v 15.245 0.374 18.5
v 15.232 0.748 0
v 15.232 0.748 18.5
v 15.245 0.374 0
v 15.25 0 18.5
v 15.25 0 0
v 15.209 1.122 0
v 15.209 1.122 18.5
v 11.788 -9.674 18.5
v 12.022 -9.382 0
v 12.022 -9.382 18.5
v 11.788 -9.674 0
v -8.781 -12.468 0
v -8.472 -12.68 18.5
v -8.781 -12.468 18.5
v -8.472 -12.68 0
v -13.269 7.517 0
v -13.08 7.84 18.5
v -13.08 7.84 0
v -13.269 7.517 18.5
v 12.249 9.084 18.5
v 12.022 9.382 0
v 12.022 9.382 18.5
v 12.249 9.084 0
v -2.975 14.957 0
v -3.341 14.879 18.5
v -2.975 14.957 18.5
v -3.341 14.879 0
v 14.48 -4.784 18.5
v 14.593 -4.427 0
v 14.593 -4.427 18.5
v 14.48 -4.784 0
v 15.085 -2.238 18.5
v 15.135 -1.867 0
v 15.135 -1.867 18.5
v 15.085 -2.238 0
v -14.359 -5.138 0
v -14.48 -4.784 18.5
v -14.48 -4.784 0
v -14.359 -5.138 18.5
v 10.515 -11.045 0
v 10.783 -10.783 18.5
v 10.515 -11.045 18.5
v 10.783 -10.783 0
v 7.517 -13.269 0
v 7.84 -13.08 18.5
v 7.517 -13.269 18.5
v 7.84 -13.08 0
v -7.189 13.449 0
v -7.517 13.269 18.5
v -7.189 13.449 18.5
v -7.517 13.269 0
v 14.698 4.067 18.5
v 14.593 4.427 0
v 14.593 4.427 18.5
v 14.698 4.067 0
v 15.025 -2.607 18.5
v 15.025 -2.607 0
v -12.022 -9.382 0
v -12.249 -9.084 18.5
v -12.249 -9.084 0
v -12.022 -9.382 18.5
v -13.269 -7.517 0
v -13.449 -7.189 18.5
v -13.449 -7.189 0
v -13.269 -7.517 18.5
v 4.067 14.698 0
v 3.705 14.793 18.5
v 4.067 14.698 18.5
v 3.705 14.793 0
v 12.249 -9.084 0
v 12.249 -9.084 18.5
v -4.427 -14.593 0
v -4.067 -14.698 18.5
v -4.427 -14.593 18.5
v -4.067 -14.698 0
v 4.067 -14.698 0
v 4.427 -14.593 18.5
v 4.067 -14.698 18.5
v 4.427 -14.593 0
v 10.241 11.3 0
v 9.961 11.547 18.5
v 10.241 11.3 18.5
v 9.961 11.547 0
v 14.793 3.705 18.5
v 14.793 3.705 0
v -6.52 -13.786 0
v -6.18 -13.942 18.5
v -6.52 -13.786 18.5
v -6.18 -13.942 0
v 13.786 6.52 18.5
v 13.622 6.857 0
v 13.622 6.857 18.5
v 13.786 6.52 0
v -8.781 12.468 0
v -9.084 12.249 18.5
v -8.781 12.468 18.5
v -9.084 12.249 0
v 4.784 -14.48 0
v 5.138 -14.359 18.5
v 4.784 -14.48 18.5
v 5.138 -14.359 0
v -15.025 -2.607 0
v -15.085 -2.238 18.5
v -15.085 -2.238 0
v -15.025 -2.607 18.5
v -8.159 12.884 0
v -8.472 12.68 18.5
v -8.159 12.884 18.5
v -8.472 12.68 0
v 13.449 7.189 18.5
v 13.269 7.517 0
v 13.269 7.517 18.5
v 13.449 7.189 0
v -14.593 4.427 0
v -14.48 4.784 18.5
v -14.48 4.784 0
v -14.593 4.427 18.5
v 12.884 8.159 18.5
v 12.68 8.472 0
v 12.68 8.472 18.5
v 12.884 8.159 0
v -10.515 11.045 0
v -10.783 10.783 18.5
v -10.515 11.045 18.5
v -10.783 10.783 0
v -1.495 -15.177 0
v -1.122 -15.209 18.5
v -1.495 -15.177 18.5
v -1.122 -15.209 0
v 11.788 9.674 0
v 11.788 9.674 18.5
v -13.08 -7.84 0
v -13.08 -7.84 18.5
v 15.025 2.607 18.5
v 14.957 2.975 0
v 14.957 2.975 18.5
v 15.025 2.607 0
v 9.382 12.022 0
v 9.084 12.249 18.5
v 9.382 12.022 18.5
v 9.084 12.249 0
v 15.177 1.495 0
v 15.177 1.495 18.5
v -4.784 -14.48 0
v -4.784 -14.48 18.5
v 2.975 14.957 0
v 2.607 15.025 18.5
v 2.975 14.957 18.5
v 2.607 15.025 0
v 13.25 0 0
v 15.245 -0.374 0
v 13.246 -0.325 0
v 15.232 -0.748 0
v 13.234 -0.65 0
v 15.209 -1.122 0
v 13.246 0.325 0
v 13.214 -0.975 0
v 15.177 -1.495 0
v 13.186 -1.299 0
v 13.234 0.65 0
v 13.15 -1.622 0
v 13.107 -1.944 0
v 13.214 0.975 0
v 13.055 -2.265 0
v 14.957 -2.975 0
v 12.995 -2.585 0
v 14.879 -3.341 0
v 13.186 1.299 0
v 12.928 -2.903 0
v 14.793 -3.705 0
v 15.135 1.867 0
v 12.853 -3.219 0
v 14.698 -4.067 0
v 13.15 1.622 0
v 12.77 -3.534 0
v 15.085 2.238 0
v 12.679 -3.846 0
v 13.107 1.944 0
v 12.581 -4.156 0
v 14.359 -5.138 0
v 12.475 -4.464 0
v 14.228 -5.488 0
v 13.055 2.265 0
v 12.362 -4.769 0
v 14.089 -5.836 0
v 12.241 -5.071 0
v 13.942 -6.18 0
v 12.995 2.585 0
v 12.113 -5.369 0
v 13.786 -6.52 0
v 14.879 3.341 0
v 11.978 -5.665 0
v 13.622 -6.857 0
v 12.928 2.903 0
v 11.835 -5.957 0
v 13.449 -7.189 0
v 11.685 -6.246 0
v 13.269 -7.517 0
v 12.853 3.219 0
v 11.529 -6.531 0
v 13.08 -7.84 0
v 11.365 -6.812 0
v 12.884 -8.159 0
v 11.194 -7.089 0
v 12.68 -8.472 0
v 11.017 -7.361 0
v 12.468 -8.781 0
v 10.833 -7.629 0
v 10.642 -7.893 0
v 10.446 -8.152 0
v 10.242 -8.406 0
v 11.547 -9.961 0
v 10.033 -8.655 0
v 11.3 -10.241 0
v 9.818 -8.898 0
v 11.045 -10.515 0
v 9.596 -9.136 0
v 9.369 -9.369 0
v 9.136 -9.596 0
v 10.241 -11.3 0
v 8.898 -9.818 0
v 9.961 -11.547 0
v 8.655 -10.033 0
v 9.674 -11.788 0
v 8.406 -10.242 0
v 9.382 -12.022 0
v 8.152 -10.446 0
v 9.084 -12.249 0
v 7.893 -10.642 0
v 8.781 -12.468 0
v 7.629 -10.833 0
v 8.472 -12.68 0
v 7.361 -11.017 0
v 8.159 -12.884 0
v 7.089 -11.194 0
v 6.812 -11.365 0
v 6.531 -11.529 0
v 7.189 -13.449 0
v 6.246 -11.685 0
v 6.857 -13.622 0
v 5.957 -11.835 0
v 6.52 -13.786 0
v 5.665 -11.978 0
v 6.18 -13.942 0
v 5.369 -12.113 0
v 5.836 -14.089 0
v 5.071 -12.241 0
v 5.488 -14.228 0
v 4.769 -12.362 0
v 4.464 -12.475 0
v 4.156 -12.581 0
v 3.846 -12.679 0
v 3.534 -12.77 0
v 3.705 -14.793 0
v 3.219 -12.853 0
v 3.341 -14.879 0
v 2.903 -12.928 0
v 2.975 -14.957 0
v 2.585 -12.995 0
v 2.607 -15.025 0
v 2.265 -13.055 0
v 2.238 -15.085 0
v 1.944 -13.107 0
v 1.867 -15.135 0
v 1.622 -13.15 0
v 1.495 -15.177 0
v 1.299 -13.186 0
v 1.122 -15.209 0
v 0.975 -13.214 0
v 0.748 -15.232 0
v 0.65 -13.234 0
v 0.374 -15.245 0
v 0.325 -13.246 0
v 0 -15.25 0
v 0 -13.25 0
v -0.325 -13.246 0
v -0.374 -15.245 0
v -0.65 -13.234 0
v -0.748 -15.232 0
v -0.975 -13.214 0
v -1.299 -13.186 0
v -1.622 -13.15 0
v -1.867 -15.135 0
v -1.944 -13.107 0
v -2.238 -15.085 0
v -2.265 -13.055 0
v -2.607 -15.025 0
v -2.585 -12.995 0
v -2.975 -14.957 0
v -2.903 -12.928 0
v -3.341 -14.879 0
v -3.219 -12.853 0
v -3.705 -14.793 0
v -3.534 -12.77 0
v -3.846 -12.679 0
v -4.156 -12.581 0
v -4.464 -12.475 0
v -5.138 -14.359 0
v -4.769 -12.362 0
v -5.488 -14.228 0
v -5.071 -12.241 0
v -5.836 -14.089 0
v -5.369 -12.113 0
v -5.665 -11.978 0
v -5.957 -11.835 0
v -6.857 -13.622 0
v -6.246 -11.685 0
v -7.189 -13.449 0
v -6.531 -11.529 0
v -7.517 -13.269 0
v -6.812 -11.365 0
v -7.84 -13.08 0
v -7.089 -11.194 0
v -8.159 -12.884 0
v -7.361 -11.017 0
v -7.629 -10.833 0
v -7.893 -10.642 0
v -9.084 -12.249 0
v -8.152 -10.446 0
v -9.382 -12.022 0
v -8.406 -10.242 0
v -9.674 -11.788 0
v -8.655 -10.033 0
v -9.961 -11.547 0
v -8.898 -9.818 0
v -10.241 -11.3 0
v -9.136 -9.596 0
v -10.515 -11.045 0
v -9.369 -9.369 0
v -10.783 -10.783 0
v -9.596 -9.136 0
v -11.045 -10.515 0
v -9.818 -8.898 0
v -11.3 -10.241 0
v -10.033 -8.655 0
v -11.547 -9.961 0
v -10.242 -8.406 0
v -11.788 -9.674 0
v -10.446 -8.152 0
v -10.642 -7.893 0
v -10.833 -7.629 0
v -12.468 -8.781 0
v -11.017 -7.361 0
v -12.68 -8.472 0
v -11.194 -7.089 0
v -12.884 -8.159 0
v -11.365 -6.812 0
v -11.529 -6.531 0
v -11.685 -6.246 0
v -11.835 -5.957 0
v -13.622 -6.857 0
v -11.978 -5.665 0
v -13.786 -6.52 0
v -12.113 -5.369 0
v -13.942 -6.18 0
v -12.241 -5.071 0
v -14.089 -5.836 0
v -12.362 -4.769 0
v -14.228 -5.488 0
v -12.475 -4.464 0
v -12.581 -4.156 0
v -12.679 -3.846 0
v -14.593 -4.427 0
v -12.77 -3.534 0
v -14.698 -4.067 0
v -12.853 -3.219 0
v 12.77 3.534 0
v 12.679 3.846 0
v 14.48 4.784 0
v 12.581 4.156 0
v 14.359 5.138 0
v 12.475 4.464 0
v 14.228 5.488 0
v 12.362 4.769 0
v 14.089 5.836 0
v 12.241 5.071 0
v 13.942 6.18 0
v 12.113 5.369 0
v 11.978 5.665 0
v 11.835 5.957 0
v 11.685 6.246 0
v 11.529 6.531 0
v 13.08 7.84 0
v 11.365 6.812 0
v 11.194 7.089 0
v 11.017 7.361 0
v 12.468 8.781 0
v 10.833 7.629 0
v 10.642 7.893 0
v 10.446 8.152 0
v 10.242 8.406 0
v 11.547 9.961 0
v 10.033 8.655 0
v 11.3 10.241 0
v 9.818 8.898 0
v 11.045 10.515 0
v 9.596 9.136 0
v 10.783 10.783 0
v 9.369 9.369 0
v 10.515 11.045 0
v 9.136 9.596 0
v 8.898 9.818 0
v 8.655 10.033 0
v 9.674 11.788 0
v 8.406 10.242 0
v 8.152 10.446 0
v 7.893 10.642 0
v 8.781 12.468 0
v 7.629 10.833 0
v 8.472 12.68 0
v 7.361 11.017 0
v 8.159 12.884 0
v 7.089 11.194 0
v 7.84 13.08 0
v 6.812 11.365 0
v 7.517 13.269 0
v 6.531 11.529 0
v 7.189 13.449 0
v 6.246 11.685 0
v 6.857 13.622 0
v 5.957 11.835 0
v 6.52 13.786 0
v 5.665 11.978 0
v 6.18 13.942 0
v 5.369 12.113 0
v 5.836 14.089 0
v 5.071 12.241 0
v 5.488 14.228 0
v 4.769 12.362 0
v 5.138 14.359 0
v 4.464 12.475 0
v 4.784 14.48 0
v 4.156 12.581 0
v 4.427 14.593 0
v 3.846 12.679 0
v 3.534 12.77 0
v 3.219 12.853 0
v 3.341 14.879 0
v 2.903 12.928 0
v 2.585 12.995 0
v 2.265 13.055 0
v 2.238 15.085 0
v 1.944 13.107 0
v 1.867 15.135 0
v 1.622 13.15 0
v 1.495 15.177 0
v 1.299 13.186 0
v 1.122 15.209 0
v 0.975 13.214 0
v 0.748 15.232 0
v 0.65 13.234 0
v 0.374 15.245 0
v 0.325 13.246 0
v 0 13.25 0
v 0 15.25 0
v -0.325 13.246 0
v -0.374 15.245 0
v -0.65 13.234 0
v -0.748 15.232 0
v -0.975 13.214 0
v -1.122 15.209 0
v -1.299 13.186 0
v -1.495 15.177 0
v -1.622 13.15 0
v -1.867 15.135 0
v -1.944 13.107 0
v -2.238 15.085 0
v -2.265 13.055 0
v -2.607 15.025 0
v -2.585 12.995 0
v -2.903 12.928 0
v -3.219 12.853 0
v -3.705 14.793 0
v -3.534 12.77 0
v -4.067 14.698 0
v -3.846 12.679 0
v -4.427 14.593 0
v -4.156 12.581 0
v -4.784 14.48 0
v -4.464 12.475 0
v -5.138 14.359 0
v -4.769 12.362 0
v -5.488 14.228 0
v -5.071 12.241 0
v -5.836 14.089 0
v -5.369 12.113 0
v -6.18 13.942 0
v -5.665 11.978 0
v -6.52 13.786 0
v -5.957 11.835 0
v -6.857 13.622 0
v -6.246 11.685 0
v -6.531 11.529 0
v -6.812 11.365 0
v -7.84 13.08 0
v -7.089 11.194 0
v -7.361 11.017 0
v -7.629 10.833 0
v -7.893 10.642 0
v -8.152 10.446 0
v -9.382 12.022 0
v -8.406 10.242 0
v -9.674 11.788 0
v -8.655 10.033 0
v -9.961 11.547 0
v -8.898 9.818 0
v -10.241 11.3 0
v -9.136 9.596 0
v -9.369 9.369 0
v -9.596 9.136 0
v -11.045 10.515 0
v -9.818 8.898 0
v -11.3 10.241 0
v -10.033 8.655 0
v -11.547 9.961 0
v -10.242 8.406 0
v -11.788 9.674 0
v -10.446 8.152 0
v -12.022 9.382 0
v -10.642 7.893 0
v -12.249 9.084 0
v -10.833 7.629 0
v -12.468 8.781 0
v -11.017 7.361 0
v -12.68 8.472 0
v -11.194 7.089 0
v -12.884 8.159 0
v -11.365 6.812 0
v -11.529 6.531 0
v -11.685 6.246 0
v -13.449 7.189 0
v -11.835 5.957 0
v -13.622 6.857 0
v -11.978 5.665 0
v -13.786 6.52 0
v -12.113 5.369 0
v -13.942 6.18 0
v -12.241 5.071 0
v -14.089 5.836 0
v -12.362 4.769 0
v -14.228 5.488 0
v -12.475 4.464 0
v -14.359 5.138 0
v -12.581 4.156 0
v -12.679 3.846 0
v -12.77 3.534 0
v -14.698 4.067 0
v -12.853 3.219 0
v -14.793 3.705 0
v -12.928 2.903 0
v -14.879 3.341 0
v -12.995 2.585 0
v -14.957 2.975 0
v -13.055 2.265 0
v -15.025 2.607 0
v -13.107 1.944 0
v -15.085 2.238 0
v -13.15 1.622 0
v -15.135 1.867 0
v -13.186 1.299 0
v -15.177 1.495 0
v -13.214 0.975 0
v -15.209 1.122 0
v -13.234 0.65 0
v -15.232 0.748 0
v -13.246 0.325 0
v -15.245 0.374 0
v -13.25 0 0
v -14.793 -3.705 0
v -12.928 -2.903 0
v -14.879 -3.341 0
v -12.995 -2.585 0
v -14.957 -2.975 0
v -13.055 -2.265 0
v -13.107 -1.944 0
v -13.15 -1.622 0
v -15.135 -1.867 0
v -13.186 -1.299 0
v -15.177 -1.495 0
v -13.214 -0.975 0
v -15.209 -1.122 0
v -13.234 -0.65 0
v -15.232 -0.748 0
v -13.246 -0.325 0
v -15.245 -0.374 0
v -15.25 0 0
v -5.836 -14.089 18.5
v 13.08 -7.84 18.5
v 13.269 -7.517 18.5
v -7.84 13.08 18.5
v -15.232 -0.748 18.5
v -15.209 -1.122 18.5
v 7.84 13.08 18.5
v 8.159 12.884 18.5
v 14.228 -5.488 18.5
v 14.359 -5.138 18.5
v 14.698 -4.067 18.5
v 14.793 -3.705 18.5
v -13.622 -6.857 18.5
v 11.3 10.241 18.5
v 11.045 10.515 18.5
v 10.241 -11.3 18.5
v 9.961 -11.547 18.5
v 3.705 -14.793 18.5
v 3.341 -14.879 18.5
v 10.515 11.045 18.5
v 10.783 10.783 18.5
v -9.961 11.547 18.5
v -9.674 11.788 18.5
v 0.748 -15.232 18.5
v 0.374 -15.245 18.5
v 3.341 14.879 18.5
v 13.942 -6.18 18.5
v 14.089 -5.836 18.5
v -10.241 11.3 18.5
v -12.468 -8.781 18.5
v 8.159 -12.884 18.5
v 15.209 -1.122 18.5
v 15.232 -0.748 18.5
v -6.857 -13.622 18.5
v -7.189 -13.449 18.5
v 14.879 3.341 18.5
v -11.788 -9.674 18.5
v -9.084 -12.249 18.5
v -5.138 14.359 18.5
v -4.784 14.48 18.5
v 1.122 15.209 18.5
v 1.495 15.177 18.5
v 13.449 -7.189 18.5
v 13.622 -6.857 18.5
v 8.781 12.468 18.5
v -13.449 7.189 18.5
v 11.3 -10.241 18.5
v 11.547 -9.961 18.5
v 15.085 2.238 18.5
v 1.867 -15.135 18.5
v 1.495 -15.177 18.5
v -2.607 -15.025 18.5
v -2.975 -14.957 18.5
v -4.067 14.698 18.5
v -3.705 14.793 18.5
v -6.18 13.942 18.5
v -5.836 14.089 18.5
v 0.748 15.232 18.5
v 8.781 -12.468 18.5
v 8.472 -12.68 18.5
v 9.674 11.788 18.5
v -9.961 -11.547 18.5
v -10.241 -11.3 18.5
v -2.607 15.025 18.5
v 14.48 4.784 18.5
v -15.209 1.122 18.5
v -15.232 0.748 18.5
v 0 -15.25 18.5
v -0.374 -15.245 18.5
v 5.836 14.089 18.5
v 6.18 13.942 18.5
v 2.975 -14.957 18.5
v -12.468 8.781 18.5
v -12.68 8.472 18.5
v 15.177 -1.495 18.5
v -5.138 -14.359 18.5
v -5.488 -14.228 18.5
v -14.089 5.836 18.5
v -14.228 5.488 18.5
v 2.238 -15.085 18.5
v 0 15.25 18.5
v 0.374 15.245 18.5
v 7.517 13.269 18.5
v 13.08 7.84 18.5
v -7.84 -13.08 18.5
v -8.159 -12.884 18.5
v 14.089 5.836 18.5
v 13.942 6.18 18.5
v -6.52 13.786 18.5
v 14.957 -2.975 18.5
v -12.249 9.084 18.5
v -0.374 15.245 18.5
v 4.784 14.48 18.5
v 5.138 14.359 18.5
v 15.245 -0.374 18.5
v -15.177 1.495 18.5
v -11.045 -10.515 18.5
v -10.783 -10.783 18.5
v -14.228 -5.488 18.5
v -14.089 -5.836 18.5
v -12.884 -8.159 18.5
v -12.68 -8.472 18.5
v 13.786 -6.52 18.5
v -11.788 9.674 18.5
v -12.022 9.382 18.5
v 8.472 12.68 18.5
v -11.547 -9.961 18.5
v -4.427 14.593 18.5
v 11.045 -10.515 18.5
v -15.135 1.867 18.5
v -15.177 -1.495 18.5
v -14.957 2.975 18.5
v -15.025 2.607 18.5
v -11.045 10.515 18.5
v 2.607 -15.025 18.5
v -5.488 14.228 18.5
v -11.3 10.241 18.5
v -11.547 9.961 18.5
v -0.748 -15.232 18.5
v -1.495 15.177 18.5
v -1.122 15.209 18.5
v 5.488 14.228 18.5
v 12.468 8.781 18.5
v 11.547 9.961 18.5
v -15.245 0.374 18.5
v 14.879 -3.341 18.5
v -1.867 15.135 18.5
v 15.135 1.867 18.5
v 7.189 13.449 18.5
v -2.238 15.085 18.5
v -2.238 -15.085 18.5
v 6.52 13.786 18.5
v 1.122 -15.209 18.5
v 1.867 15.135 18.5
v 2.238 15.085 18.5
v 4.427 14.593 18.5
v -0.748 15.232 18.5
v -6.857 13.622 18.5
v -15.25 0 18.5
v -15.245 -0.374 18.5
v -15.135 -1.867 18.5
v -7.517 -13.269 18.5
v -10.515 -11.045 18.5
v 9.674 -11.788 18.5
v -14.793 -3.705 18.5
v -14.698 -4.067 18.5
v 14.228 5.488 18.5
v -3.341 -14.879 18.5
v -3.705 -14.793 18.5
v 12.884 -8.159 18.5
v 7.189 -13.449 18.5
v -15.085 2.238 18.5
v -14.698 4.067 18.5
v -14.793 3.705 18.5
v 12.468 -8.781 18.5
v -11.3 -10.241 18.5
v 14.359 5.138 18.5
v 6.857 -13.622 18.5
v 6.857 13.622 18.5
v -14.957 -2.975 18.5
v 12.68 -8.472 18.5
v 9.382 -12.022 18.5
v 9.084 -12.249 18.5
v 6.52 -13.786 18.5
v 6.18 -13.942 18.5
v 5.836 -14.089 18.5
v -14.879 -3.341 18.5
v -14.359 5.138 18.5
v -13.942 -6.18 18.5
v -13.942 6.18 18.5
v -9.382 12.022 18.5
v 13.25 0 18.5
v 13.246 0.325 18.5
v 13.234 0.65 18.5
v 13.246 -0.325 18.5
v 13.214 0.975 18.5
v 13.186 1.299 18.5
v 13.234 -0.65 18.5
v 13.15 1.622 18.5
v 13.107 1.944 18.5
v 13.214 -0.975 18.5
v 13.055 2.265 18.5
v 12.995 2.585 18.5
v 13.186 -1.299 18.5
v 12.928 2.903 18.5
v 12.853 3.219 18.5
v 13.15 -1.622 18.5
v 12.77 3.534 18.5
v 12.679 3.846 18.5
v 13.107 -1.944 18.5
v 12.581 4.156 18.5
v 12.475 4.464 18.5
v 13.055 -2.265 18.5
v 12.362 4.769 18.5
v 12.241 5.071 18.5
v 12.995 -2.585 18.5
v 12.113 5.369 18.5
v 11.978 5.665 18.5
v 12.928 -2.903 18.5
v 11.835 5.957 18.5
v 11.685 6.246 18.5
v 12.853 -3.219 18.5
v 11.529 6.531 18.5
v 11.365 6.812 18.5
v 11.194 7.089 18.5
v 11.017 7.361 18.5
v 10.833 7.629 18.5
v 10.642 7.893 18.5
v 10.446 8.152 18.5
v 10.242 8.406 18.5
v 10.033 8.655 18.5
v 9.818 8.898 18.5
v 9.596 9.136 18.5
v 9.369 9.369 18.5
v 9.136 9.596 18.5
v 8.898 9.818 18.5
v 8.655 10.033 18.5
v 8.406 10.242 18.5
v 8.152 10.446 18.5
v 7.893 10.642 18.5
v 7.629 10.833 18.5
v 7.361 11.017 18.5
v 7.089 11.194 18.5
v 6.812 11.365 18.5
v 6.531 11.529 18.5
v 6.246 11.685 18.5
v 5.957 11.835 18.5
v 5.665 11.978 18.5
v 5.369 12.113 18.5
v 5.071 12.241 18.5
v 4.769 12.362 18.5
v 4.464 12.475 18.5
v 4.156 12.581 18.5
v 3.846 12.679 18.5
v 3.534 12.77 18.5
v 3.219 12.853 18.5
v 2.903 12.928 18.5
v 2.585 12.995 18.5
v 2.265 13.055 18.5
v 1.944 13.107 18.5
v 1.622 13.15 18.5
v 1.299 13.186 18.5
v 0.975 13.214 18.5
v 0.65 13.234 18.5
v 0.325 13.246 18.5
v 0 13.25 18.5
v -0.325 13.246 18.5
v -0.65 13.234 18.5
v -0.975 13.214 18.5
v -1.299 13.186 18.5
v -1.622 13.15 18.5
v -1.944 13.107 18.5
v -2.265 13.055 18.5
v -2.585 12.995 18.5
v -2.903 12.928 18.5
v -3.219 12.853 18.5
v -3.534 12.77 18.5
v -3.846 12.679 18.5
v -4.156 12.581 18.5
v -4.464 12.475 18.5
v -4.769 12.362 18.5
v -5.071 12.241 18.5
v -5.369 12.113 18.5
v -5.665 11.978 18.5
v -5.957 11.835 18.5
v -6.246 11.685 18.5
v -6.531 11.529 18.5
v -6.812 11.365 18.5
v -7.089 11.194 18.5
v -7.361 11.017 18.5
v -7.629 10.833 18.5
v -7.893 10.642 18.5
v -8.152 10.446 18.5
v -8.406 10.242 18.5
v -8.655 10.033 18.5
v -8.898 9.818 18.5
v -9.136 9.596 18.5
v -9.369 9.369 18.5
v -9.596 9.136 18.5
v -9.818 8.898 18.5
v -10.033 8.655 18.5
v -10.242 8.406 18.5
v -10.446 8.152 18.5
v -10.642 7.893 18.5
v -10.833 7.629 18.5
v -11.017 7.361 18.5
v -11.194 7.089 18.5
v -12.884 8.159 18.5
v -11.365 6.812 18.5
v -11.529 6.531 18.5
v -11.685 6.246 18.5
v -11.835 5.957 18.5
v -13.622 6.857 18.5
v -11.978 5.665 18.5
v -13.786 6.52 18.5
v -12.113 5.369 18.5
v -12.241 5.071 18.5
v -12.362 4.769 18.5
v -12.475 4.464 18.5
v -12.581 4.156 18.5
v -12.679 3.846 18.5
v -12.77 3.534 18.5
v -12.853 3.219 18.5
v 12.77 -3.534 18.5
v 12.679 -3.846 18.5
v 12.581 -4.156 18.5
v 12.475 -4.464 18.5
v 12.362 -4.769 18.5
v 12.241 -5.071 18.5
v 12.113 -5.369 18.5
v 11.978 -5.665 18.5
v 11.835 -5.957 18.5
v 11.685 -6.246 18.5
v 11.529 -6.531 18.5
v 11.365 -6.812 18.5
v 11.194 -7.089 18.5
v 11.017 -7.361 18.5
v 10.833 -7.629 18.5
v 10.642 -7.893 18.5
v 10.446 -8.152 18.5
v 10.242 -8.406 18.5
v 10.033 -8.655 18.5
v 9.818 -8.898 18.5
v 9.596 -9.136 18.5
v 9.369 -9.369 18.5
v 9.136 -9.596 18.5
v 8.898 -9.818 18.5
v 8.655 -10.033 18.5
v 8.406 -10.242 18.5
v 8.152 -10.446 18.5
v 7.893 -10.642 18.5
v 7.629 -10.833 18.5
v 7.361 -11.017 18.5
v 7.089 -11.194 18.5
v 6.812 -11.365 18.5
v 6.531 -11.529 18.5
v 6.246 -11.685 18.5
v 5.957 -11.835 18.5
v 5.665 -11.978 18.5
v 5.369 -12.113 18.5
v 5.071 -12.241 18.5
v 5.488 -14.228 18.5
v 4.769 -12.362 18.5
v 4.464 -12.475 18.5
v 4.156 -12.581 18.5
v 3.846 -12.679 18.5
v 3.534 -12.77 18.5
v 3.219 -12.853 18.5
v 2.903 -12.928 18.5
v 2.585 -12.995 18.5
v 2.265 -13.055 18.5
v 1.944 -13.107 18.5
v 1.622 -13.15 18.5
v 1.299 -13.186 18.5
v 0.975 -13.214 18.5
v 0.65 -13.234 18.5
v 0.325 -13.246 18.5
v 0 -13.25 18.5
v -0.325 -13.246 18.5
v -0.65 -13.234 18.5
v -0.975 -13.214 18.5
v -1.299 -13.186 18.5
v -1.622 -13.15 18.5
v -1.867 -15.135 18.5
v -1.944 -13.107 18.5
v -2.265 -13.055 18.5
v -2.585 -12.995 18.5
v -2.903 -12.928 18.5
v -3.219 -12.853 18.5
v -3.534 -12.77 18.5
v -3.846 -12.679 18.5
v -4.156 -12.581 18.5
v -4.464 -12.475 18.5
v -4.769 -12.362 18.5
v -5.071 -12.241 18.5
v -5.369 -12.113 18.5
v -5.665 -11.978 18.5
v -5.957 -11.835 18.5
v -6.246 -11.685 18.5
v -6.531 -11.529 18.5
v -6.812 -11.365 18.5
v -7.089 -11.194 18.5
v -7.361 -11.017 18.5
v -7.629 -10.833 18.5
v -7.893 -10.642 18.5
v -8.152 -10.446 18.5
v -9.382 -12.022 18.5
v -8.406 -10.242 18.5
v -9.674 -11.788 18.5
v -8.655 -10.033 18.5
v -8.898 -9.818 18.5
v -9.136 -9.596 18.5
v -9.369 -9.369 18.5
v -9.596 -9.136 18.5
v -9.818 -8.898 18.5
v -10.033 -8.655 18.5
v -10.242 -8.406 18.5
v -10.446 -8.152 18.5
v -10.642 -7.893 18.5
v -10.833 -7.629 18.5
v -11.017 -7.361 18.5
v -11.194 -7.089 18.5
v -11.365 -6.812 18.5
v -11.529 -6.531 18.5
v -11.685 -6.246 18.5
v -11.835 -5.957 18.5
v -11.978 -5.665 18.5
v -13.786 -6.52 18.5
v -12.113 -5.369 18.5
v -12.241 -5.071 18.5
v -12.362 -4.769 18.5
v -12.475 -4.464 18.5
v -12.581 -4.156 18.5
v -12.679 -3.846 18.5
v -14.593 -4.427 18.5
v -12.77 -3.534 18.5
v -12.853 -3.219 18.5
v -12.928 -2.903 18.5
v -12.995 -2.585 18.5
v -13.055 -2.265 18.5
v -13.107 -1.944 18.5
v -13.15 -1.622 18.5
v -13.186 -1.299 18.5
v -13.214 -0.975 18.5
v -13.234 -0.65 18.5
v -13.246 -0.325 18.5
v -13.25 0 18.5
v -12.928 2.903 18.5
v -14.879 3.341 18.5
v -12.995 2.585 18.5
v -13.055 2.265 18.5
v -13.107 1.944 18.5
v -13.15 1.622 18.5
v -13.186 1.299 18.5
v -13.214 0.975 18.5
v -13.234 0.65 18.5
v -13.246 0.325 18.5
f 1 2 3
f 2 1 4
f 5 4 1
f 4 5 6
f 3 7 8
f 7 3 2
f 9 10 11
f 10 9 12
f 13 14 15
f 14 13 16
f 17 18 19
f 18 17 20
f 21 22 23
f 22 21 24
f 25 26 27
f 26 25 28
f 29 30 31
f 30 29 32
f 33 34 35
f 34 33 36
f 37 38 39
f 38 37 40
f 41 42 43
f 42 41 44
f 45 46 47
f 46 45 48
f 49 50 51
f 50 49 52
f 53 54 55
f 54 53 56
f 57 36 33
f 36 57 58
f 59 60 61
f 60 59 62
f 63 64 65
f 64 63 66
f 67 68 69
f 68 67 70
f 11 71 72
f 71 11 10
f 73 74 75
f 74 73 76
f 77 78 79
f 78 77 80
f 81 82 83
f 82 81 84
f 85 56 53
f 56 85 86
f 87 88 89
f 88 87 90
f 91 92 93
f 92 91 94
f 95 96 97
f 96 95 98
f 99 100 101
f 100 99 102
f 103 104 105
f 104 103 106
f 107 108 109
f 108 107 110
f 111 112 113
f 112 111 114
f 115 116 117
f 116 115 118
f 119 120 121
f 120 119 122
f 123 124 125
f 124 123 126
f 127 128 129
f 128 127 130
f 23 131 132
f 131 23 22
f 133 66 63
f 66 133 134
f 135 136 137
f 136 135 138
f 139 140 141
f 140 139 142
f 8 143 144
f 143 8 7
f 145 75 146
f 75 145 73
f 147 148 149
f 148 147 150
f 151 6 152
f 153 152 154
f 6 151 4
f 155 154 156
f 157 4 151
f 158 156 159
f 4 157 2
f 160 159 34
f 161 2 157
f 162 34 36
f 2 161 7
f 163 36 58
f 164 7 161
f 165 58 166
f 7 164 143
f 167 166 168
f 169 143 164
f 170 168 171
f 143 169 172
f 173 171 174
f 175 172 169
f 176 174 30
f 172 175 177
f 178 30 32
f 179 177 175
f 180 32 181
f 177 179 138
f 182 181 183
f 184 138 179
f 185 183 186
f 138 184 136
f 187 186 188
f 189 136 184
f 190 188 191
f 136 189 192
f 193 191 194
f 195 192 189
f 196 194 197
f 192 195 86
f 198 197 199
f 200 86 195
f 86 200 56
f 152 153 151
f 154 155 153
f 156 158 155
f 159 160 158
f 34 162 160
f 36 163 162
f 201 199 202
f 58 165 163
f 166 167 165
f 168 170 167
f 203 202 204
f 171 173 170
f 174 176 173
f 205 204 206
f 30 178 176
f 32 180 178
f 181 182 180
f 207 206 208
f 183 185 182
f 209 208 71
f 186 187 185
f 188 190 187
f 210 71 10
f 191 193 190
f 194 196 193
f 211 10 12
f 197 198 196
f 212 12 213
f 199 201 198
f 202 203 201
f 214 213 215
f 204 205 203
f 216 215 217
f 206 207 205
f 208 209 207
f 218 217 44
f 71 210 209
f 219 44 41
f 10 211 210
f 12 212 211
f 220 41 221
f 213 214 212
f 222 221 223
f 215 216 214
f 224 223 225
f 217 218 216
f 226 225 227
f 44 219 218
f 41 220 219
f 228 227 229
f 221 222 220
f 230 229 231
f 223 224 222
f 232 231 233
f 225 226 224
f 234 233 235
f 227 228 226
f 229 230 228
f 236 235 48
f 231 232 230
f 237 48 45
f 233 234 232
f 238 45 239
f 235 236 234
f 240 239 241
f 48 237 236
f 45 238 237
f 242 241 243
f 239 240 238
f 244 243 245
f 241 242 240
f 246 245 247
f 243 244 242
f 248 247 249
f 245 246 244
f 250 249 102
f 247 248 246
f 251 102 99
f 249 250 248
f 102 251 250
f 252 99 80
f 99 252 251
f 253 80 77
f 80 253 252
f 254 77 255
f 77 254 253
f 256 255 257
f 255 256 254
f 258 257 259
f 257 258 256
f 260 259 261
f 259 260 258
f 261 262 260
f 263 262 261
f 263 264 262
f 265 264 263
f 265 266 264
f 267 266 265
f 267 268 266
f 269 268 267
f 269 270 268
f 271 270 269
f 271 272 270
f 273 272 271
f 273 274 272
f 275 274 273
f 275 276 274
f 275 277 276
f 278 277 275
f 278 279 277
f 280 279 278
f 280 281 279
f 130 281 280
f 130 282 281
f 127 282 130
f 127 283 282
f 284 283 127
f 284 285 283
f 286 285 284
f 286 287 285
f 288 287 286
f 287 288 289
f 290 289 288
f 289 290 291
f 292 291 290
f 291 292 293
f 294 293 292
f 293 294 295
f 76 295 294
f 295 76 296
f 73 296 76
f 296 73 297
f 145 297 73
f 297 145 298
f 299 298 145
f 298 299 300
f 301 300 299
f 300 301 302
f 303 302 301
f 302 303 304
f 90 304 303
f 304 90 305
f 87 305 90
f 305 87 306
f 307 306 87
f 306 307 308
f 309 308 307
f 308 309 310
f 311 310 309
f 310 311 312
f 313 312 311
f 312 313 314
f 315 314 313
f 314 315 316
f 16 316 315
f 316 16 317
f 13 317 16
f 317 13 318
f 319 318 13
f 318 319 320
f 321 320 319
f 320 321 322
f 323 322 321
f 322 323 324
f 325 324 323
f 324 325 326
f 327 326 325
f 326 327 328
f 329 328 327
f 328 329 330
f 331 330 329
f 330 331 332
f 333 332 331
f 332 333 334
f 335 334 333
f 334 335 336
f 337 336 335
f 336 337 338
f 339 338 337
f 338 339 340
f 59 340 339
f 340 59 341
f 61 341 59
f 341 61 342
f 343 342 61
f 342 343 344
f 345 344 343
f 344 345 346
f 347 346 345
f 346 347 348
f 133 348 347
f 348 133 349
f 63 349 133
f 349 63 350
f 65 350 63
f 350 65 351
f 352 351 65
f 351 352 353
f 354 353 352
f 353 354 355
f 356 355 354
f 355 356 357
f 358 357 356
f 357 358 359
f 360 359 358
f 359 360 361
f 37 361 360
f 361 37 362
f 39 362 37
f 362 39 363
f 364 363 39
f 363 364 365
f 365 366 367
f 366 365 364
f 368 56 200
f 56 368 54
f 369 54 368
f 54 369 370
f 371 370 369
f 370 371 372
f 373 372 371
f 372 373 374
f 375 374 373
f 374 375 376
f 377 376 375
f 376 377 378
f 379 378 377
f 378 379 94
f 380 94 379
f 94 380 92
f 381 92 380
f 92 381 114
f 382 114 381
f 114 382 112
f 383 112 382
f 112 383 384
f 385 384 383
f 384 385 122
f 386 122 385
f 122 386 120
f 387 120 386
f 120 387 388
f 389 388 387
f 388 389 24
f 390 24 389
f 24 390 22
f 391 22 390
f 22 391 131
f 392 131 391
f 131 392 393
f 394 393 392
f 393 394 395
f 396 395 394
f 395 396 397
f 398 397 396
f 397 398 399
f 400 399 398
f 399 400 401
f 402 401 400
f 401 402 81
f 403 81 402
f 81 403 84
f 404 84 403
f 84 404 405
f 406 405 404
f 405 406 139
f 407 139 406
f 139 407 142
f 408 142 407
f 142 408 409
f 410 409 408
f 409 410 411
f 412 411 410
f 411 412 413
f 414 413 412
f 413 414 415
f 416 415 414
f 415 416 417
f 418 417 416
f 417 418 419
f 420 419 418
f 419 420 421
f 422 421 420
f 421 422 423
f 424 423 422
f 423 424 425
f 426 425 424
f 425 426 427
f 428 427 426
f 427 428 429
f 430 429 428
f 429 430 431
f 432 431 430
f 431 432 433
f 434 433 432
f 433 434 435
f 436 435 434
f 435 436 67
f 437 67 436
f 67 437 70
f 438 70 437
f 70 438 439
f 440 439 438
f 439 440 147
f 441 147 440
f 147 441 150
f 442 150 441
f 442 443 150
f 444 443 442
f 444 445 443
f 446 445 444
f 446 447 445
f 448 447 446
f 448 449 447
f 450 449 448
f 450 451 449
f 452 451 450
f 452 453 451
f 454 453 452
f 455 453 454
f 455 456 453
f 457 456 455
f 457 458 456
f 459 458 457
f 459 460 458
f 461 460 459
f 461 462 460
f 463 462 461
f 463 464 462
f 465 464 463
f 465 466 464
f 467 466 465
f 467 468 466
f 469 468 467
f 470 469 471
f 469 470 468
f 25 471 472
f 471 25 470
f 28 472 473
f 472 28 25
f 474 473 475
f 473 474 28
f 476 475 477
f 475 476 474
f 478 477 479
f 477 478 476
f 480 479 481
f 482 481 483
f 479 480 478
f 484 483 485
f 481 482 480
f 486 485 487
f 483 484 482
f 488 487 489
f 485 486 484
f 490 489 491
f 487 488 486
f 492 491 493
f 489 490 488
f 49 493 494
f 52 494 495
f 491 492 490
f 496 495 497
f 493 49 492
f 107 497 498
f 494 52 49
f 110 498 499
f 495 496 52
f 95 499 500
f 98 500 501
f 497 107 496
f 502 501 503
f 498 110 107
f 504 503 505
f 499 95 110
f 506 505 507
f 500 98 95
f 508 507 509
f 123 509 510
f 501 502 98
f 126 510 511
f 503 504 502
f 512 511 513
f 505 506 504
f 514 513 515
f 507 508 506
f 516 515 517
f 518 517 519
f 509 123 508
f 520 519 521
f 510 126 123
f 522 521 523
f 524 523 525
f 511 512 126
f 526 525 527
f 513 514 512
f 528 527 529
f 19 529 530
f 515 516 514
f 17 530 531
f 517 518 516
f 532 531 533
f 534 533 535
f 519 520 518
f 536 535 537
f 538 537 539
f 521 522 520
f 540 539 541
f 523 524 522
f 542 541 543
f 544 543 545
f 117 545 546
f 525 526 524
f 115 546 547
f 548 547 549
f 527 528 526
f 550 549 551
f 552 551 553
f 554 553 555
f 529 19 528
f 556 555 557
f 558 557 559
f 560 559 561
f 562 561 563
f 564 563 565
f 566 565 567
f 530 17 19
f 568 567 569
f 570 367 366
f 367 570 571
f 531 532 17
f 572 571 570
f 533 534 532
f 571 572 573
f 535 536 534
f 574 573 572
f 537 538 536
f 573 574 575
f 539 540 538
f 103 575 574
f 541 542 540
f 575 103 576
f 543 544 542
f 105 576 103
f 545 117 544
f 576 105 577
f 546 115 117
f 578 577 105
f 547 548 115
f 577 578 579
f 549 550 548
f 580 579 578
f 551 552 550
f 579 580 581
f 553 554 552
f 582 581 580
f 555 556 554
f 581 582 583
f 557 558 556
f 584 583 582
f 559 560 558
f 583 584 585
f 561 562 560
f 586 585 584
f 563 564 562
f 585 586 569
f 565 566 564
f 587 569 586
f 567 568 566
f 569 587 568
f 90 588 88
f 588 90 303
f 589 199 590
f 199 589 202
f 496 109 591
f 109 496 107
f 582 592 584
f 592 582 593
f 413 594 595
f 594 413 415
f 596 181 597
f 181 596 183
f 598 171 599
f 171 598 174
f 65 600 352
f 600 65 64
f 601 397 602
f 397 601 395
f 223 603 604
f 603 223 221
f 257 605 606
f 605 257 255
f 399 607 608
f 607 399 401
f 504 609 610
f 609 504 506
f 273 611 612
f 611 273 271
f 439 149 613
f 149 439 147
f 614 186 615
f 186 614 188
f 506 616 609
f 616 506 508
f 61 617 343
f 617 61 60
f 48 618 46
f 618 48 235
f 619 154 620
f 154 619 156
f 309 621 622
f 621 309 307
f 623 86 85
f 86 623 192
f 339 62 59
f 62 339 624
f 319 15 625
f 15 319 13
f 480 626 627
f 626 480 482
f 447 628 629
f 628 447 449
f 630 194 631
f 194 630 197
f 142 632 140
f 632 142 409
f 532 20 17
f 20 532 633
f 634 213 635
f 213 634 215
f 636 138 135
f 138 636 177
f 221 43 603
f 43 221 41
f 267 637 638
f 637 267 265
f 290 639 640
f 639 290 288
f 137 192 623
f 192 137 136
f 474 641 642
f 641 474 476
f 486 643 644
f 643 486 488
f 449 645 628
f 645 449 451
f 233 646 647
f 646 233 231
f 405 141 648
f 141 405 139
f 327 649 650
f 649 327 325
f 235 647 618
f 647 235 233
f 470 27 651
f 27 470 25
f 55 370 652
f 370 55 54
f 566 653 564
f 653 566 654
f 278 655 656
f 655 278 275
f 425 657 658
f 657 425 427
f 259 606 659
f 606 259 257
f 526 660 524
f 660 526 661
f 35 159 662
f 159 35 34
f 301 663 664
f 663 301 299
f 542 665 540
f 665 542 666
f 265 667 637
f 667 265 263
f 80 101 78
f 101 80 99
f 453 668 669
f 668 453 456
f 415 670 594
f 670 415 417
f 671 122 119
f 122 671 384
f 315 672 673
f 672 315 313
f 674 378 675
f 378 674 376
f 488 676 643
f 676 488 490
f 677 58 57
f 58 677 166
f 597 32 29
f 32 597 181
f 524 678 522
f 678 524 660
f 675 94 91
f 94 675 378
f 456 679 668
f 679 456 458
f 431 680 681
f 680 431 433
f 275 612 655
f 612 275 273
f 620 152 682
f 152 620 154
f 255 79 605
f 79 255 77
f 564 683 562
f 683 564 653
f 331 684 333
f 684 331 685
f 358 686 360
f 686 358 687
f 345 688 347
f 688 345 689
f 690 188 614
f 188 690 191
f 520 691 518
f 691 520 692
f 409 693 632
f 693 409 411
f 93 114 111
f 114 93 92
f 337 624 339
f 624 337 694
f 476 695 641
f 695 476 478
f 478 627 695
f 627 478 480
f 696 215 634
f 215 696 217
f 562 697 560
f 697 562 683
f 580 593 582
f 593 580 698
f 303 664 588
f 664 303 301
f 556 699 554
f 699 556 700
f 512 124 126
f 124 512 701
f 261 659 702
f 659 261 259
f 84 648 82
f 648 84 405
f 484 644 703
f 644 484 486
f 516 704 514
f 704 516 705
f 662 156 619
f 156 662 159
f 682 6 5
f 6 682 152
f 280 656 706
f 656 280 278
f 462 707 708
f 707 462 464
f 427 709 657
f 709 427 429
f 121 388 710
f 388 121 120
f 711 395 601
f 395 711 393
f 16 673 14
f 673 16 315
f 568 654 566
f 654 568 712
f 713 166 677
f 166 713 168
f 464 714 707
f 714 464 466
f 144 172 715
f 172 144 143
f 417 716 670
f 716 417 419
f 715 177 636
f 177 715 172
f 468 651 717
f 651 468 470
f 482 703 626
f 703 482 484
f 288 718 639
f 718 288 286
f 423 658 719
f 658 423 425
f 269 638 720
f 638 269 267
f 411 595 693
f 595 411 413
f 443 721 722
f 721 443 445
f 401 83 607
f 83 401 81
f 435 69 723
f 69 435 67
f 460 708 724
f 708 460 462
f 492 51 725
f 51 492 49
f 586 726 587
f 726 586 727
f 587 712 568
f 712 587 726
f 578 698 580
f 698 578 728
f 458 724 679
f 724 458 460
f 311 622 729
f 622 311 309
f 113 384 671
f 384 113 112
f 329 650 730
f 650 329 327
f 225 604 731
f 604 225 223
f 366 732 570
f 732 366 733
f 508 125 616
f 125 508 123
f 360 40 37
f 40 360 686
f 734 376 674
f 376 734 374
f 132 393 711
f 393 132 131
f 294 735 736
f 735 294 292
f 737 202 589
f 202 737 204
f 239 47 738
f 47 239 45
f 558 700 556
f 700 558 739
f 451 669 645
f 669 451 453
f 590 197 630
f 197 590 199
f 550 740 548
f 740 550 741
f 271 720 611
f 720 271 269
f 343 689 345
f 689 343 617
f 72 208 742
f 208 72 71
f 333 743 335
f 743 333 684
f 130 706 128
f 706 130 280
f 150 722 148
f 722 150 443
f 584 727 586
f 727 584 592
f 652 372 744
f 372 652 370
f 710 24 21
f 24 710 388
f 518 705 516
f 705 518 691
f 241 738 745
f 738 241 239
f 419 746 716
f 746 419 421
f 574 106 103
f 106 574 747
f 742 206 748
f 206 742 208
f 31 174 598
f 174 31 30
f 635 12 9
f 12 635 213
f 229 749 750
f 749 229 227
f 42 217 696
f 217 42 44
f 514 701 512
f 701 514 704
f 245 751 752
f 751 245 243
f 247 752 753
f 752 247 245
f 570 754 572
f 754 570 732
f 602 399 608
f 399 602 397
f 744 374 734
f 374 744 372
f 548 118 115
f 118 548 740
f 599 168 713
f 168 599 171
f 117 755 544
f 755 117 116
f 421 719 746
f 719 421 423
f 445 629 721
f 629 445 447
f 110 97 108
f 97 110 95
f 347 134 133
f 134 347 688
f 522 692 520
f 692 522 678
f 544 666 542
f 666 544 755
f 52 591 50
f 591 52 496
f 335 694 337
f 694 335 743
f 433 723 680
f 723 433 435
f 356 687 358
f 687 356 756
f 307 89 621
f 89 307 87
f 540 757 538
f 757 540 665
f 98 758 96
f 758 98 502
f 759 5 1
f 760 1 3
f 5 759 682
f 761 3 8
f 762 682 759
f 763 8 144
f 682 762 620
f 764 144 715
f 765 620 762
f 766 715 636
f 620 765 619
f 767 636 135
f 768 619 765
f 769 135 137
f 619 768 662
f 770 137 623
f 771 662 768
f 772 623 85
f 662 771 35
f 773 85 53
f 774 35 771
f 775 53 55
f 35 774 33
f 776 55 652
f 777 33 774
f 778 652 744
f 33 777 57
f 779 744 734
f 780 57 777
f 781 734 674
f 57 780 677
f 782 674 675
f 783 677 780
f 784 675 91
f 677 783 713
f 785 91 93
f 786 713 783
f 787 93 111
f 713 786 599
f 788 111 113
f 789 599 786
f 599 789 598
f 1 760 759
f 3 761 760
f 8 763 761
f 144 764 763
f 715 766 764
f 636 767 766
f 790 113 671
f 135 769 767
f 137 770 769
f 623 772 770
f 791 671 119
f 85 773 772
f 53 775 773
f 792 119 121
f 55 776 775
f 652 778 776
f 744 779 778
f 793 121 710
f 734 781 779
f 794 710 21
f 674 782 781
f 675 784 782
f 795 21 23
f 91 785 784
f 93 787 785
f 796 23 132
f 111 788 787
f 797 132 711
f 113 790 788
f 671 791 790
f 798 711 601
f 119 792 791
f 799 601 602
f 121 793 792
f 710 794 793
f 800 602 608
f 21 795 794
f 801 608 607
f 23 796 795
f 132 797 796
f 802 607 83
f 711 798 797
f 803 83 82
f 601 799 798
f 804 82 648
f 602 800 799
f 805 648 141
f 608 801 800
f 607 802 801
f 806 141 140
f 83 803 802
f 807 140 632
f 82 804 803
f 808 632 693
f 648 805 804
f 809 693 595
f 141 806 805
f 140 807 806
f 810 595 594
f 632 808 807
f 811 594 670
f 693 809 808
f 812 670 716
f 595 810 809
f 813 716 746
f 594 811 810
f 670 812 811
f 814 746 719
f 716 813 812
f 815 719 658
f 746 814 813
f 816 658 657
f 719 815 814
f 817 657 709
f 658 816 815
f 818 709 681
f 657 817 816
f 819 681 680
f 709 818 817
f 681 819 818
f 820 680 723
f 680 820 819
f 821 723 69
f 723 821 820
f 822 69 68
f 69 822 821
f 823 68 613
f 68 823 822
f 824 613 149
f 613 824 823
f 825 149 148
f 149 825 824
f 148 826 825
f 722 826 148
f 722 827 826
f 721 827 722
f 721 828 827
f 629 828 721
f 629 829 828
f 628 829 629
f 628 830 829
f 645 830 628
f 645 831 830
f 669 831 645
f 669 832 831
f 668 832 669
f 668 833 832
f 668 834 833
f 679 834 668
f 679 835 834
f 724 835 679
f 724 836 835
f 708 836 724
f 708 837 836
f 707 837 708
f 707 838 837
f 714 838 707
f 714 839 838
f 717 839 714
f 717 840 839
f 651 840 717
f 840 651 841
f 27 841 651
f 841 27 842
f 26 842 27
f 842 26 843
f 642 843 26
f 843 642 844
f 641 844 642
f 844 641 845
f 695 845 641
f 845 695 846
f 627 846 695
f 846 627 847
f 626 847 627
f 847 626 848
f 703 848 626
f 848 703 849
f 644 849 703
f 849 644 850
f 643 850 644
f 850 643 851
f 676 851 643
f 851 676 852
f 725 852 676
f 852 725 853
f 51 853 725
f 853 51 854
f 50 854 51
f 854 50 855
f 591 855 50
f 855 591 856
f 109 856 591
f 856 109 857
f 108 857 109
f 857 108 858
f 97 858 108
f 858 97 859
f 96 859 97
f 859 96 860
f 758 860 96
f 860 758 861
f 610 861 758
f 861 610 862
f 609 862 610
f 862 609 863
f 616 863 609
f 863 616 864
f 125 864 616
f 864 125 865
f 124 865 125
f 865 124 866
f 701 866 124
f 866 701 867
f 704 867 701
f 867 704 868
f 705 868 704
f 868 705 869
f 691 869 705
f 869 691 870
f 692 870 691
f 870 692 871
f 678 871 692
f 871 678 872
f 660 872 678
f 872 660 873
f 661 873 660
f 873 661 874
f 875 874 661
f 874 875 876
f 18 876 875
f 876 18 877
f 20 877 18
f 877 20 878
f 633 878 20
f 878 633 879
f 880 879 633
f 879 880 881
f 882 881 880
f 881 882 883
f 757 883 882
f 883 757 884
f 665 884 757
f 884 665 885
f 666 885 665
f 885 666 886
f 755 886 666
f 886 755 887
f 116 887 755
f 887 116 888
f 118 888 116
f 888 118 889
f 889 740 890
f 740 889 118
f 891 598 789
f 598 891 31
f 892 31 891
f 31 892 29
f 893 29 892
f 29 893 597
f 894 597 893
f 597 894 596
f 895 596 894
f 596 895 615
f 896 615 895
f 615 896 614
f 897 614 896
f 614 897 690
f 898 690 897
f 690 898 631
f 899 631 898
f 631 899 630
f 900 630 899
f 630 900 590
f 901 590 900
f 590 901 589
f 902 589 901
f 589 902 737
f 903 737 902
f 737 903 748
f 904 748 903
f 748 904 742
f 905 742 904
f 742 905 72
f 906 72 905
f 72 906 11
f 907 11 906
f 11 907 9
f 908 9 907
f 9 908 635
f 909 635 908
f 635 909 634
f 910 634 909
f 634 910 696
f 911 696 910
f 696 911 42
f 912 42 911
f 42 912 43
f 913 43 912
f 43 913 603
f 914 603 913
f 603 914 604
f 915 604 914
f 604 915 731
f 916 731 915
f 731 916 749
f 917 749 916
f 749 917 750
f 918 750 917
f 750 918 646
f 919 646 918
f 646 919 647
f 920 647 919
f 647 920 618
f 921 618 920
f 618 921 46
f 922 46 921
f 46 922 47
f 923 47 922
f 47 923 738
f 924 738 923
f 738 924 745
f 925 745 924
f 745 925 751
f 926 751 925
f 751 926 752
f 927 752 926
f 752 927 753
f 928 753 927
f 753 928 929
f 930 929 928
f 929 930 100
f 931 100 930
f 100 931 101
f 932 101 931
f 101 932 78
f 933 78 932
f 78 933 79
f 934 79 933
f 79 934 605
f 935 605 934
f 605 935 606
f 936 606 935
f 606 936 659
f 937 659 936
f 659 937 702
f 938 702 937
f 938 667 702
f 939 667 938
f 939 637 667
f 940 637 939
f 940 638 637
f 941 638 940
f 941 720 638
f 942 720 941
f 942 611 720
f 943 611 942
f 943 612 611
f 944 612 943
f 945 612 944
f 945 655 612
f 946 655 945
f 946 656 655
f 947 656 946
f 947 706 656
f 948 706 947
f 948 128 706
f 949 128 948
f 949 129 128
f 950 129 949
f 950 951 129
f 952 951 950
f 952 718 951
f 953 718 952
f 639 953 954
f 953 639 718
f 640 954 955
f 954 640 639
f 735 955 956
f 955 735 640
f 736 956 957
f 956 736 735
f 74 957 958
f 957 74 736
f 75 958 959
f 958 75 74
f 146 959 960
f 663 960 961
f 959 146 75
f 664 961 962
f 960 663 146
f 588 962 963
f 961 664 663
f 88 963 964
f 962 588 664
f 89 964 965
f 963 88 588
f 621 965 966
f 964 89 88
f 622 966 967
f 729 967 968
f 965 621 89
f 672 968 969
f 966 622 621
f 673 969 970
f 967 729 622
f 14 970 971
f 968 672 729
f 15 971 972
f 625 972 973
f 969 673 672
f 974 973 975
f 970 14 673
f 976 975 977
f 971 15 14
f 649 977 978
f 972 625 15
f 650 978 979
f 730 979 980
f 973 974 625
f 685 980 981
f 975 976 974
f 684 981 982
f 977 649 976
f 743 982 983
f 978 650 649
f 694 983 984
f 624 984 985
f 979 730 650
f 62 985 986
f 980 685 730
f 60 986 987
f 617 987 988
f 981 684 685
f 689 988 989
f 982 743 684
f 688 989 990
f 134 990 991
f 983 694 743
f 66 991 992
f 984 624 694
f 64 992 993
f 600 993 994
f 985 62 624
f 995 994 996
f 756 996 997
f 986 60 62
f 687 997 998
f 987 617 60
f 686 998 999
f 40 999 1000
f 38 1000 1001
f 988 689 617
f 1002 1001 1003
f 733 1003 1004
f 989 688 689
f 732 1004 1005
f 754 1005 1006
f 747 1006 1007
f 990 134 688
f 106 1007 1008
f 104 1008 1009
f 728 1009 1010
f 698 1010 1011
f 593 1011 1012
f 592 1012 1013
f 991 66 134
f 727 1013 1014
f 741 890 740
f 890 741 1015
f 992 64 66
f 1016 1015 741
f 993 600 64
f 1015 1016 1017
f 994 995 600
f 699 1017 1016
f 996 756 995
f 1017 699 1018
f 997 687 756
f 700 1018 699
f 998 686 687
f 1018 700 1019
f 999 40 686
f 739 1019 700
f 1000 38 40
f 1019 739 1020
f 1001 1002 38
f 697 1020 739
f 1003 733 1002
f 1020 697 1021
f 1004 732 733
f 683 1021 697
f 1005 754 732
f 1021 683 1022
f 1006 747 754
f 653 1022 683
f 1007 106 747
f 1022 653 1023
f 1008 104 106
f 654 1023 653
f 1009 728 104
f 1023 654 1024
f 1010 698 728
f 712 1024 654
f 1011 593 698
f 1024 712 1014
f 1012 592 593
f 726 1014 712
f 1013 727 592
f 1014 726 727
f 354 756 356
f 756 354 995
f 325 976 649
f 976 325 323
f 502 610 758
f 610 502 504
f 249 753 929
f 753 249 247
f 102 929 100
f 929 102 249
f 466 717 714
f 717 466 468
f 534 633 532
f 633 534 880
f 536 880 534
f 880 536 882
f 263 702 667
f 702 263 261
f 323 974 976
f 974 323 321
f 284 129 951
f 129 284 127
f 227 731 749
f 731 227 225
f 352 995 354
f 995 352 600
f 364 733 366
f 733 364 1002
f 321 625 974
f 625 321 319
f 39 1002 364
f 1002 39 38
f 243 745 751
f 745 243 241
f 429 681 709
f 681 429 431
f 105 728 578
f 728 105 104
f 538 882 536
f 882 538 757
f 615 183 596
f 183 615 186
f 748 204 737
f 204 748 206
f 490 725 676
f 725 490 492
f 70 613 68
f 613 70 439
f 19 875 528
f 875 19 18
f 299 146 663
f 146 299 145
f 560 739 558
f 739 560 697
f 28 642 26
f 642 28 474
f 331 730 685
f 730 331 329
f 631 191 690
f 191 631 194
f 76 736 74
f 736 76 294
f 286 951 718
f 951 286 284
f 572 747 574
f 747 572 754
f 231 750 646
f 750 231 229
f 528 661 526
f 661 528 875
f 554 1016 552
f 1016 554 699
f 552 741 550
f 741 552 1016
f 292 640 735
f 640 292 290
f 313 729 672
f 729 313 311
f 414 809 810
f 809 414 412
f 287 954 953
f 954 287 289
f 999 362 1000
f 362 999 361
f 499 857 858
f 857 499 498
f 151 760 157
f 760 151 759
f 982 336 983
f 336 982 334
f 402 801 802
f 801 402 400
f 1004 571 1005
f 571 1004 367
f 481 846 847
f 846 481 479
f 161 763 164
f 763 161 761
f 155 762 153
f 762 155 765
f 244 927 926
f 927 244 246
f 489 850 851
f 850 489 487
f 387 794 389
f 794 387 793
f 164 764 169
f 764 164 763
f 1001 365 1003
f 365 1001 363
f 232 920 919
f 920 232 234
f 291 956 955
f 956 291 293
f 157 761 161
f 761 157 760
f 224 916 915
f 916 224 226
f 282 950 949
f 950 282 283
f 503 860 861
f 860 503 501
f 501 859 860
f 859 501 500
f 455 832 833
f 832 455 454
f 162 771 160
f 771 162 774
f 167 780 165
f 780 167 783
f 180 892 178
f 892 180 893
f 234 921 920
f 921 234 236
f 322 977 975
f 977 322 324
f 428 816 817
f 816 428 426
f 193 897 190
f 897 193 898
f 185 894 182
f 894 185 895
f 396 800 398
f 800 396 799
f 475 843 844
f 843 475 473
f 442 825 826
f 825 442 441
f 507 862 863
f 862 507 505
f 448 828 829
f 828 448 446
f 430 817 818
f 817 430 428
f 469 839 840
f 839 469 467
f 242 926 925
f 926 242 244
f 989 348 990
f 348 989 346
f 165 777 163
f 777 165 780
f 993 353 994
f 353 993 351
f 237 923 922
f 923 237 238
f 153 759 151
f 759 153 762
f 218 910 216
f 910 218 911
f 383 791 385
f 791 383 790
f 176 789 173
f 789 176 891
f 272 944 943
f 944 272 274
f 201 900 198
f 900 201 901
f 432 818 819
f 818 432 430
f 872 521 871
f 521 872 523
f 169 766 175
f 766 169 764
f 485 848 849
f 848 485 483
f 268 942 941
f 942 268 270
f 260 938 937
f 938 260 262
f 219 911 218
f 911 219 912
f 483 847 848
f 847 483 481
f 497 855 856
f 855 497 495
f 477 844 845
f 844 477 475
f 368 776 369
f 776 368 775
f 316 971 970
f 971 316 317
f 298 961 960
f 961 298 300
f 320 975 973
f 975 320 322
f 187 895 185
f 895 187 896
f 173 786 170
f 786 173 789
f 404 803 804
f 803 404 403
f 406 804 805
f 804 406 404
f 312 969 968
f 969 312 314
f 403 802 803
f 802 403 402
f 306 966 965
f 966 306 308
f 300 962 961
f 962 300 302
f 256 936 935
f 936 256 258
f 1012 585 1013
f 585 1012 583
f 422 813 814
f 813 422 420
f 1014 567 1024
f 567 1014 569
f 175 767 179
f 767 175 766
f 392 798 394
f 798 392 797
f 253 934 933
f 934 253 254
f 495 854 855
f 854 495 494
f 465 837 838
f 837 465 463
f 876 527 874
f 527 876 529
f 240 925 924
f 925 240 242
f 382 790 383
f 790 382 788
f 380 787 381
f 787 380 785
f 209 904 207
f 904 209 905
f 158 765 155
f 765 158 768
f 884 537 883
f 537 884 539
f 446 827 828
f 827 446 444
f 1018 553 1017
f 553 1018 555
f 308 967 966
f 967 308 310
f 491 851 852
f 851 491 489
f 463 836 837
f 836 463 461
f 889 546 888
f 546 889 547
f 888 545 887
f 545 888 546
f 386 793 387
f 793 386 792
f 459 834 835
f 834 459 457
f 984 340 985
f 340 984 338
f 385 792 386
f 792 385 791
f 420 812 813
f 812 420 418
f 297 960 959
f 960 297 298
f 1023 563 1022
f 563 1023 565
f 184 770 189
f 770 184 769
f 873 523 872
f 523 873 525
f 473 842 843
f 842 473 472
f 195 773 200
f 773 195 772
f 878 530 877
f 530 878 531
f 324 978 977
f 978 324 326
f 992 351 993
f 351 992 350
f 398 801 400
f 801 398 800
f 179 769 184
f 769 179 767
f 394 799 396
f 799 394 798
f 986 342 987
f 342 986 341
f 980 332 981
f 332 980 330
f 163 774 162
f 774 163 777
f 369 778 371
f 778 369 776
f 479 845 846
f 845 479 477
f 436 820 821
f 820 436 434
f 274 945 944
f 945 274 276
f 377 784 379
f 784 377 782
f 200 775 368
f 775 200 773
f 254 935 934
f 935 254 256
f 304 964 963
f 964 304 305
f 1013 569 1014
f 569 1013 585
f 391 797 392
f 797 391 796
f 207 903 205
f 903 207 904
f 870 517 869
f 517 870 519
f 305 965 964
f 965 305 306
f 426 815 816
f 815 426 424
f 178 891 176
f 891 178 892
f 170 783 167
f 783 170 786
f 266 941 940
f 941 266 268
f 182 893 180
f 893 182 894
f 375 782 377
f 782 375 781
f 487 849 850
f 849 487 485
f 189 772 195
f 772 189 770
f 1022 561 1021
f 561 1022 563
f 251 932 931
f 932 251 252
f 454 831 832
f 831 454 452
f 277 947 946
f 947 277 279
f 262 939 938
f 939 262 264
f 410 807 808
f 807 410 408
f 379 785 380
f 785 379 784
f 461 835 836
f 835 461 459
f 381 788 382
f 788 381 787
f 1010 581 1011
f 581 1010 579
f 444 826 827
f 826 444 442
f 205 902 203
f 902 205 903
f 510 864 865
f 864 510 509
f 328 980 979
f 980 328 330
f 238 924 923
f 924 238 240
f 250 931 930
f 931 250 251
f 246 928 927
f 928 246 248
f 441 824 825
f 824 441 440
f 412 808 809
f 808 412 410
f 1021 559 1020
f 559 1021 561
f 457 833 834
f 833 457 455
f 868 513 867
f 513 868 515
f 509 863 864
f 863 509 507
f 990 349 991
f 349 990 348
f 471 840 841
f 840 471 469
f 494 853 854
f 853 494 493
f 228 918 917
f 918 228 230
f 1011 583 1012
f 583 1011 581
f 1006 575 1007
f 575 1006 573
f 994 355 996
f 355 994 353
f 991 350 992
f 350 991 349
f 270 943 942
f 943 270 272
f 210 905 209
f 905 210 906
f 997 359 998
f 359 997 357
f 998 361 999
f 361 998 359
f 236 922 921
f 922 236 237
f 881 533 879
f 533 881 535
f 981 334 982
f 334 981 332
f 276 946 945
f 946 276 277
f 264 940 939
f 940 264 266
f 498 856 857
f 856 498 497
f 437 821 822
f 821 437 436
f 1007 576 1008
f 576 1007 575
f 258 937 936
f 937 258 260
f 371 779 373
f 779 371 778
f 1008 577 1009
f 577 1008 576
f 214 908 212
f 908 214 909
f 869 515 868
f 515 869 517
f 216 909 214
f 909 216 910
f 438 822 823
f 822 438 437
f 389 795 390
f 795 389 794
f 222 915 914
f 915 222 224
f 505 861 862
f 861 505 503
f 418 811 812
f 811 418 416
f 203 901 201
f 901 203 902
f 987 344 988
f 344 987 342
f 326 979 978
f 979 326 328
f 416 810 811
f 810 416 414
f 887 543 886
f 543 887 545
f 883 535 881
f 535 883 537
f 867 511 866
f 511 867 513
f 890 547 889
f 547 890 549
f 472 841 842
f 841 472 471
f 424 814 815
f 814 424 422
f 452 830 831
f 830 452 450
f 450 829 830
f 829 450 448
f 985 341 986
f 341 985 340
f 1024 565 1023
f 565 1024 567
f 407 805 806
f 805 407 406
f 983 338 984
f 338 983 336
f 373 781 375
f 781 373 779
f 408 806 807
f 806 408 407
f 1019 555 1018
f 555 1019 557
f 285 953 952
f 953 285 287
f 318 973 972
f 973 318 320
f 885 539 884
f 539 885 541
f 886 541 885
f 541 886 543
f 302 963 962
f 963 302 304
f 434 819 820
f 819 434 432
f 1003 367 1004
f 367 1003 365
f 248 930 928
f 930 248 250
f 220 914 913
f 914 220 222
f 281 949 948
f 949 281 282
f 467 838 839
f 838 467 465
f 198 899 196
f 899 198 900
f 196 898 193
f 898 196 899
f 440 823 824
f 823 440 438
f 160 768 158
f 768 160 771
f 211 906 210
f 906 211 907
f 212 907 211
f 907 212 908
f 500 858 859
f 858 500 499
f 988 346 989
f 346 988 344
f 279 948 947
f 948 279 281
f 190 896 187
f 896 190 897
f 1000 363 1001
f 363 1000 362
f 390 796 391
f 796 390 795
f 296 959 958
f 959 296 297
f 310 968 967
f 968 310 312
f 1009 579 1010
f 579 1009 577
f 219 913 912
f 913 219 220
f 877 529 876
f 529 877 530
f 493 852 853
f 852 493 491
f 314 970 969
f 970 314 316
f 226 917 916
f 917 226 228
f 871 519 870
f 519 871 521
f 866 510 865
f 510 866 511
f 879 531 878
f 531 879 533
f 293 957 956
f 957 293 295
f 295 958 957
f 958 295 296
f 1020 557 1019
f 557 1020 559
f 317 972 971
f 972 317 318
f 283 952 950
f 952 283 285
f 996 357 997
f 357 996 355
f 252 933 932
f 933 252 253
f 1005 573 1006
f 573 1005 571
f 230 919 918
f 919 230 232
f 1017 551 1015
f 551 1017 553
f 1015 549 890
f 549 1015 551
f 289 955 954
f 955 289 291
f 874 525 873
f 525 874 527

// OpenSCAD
$fn=256;
a=25.5;
height=18.5;
inside_diameter=26.5;

difference() {
    cylinder(d = inside_diameter + 4, h=height);

    translate([0,0,-1])
        cylinder(d = inside_diameter, h=height+2);
    
}
